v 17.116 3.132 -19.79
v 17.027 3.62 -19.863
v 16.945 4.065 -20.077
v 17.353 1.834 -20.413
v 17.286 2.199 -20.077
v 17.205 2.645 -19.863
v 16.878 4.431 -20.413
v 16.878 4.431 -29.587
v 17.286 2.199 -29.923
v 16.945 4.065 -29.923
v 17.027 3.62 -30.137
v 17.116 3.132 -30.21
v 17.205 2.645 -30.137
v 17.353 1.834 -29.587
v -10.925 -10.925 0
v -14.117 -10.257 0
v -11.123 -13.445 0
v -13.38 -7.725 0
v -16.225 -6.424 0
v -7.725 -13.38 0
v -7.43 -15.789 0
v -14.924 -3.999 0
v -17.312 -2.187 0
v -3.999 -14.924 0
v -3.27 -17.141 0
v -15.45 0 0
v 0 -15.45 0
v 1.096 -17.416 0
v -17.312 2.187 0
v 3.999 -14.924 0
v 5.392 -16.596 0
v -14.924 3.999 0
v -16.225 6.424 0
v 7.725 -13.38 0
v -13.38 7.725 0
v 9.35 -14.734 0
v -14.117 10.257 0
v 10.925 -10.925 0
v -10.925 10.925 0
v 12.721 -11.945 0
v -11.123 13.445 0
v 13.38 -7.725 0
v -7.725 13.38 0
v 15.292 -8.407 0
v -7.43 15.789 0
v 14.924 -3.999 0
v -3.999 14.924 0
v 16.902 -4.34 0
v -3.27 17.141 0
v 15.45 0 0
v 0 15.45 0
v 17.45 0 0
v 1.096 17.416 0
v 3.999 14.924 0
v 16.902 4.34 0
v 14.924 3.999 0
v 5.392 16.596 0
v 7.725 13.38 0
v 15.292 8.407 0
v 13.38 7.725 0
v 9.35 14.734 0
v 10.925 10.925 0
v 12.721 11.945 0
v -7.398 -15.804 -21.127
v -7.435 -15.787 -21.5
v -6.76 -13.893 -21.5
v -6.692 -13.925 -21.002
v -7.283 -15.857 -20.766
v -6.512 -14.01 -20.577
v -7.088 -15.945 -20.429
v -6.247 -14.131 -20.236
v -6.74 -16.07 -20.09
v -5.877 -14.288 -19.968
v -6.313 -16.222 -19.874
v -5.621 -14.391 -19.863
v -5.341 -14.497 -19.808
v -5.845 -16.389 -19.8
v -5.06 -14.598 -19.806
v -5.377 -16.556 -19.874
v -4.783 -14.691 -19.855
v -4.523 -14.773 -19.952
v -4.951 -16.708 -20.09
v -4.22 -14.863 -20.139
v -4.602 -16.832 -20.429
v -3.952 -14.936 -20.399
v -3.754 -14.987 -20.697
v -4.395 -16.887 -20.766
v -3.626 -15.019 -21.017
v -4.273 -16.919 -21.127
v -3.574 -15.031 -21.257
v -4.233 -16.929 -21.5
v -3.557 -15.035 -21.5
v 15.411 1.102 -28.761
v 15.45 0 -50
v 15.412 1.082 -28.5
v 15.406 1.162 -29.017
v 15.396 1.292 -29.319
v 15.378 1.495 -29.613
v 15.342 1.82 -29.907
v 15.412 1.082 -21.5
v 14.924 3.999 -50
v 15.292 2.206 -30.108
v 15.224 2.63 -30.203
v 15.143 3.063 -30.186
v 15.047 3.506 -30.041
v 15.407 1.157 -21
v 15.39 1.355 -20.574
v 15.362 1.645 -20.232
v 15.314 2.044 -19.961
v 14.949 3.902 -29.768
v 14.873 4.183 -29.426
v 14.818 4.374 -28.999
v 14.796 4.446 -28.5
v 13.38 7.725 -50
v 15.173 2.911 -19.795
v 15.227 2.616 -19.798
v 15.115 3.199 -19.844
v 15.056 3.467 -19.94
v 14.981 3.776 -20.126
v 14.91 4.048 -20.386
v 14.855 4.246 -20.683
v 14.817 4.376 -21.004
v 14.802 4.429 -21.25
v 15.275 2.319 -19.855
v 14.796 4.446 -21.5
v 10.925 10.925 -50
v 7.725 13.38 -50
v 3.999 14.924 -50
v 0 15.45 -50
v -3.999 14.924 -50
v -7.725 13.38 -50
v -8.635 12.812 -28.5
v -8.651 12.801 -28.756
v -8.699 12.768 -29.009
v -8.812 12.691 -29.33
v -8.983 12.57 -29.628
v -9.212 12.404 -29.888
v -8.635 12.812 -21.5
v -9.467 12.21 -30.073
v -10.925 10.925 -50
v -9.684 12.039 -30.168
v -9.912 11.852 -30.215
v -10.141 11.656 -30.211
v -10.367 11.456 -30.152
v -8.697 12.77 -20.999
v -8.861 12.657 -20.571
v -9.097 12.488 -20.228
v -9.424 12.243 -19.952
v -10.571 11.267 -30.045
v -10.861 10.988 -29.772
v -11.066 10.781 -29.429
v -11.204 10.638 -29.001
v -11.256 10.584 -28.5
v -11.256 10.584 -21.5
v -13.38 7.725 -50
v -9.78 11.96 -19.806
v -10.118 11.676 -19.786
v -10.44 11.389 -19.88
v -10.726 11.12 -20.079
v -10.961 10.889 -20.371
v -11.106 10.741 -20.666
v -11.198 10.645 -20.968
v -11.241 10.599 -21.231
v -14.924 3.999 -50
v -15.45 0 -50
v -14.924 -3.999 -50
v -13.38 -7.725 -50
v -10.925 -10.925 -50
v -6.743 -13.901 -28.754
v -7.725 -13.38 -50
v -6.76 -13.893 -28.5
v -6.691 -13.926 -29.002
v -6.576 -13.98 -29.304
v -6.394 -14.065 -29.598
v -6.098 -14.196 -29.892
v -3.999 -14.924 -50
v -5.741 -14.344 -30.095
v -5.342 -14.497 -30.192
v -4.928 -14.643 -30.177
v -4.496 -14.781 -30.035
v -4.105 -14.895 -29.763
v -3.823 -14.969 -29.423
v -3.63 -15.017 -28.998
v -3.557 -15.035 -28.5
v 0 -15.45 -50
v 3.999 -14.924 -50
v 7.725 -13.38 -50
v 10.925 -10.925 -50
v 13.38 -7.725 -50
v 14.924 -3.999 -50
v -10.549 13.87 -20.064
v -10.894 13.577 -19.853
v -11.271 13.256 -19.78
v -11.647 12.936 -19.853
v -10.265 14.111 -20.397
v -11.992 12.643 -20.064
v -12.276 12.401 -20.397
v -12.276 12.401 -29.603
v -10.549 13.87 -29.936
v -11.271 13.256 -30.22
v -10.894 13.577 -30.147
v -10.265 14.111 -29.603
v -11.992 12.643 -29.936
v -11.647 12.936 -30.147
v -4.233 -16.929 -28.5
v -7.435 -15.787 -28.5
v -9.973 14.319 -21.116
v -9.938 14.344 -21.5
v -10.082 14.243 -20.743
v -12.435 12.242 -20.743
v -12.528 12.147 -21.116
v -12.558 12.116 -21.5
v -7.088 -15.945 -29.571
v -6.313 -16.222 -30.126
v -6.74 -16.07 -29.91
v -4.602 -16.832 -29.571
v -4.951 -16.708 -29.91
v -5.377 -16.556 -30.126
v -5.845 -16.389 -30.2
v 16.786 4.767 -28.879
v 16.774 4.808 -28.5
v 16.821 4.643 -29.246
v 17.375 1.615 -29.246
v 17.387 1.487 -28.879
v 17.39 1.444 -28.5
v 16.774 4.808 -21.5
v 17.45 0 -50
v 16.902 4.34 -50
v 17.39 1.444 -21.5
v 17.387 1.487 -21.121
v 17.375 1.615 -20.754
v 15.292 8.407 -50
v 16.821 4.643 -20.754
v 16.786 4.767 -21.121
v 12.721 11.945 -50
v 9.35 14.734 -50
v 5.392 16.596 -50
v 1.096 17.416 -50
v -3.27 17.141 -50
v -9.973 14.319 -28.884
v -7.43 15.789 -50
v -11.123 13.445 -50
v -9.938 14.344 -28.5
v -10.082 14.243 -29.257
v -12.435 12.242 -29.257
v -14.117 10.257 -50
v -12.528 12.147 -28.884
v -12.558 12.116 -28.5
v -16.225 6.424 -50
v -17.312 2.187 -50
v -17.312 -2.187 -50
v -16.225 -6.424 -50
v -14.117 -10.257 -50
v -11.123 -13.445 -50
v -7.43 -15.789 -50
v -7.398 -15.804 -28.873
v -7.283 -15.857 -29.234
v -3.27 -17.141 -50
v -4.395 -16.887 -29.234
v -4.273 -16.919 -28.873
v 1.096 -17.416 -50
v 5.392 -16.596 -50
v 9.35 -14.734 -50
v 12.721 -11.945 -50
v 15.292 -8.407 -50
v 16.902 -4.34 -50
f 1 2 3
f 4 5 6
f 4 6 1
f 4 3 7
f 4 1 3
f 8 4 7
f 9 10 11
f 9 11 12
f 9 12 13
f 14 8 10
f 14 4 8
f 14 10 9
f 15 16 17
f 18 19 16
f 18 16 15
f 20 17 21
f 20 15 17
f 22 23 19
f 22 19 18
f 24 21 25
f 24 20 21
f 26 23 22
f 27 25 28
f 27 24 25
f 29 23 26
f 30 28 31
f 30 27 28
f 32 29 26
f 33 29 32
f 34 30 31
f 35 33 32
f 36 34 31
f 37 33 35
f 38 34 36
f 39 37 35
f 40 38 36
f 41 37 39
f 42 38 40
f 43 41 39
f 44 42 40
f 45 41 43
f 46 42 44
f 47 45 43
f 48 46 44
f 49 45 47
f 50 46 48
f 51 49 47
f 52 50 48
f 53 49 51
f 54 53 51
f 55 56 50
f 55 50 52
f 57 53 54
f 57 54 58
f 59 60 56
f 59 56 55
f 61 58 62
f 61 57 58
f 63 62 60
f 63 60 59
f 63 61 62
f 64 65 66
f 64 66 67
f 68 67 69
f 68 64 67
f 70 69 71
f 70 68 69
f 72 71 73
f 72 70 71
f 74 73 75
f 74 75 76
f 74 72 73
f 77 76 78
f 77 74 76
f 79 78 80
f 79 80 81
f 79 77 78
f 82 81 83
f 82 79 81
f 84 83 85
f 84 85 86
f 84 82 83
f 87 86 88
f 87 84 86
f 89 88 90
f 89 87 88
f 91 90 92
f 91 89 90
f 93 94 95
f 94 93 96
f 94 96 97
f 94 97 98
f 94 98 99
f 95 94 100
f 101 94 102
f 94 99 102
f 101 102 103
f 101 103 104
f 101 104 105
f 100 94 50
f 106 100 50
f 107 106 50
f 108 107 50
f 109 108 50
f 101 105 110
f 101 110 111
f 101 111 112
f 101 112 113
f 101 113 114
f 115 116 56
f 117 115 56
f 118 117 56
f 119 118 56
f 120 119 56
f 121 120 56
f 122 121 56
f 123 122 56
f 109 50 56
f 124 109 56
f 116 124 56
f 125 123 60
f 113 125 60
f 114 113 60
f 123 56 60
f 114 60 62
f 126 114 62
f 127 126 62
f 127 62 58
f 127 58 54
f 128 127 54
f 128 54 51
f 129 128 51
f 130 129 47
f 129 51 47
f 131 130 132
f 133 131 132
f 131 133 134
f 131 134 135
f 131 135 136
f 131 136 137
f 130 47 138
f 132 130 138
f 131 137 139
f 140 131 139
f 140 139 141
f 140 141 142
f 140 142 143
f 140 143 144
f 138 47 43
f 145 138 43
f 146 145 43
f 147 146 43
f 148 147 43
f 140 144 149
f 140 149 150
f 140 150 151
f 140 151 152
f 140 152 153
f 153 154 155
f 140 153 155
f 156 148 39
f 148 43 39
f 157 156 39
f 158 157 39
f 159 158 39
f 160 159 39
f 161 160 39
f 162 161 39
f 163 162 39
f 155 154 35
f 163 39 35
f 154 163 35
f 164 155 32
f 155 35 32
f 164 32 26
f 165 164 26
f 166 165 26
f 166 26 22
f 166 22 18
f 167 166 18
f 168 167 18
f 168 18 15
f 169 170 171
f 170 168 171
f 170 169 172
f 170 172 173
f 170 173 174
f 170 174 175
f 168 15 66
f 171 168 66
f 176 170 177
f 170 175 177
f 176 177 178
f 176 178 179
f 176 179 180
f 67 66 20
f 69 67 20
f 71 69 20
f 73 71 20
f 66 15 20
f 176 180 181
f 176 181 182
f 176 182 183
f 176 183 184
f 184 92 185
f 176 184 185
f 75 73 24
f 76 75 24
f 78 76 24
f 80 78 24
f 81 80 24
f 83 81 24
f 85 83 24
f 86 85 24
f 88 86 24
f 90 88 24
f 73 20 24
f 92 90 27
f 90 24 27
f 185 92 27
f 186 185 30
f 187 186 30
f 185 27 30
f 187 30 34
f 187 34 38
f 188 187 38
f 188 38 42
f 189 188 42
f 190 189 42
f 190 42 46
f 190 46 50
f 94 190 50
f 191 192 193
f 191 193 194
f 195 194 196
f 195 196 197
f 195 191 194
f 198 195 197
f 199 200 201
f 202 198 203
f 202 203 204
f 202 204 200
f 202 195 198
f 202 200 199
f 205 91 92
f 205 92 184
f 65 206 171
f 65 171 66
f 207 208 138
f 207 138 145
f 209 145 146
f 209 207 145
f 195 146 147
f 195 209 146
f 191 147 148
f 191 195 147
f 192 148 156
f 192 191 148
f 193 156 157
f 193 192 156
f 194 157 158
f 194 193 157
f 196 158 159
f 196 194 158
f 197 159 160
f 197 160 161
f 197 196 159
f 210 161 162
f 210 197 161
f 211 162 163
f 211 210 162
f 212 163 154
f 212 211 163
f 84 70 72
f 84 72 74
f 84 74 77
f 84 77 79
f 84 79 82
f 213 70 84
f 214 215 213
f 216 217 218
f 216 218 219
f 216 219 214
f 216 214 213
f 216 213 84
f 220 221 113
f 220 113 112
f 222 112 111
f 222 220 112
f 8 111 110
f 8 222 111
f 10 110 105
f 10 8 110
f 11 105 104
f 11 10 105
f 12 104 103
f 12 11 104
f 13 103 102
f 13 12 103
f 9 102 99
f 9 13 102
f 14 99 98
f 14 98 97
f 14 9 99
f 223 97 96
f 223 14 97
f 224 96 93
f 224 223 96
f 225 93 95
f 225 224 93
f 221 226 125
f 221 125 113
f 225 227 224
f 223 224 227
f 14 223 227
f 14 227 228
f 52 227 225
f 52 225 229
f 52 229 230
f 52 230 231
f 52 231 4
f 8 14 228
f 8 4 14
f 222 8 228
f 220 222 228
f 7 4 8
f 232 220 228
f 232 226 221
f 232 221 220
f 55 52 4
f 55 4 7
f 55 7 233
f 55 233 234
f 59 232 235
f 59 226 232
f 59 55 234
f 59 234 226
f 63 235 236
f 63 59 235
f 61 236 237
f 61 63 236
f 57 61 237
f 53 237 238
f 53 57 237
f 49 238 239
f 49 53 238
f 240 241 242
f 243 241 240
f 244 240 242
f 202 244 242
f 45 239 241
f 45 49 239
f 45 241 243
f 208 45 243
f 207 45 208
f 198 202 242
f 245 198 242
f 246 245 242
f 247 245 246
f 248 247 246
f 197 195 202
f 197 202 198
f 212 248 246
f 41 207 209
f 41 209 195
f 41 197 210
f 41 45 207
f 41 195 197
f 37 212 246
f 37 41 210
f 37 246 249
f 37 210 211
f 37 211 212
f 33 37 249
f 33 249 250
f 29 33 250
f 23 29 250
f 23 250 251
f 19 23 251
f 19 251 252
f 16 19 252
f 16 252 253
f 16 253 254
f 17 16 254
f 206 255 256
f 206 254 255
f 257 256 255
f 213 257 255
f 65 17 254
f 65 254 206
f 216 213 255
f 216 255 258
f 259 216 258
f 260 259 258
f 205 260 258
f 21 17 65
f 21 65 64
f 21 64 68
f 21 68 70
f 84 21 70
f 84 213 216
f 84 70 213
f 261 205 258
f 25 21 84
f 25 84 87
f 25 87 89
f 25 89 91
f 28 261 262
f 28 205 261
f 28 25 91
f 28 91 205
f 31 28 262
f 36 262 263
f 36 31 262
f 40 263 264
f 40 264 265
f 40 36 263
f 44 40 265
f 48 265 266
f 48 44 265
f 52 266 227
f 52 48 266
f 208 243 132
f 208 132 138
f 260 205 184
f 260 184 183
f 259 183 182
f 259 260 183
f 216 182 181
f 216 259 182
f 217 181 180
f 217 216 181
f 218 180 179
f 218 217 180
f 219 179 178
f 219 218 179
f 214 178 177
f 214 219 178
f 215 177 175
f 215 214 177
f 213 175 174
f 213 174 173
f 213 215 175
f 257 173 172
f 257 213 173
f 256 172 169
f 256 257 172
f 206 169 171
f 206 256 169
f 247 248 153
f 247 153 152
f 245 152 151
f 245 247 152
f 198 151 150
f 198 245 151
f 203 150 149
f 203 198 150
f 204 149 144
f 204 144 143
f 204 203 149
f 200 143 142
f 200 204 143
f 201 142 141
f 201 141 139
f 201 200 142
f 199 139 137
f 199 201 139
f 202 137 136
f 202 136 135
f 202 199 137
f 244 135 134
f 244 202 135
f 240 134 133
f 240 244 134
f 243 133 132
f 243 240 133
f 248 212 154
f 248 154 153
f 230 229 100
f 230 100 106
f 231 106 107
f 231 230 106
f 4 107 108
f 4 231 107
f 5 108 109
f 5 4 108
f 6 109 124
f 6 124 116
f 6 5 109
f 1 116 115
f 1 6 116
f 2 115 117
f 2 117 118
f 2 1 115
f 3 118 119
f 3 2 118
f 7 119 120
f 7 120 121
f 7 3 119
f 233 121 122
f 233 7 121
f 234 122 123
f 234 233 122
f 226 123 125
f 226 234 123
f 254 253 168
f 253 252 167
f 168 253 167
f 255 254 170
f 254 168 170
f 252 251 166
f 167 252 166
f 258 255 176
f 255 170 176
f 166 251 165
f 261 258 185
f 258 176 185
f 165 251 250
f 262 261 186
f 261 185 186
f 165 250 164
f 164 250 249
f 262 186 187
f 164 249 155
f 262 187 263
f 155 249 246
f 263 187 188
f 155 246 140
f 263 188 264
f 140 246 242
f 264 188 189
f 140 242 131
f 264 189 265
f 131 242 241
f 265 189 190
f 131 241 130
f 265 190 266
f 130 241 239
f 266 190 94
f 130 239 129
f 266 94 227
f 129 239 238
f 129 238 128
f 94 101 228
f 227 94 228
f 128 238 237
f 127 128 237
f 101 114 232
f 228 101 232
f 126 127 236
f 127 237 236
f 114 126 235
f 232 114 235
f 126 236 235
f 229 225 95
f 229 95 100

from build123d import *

# Parameters (mm, degrees)
ESQUISSE1_R                  = 17.45
ESQUISSE1_R_2                = 15.45
BOSS_EXTRU_1_DEPTH           = 50
ENL_V_MAT_EXTRU_1_REACH      = 66.713
ENL_V_MAT_EXTRU_2_REACH      = 66.175
ENL_V_MAT_EXTRU_3_REACH      = 67.328
ENL_V_MAT_EXTRU_3_END_RADIUS = 15.45


with BuildPart() as part:
    # Esquisse1 → Boss.-Extru.1 (new body)
    with BuildSketch(Plane.XY):
        Circle(ESQUISSE1_R)
        Circle(ESQUISSE1_R_2, mode=Mode.SUBTRACT)
    extrude(amount=-BOSS_EXTRU_1_DEPTH)

    # Esquisse2 → Enlèv. mat.-Extru.1 (cut, up to next)
    with BuildSketch(Plane(origin=(-5.845108935, -16.388859068, 0), x_dir=(-0.9418884521644214, 0.3359258008538648, 0), z_dir=(-0.3359258008538648, -0.9418884521644214, 0)), mode=Mode.PRIVATE) as enl_v_mat_extru_1_sk1:
        with BuildLine():
            Line((1.7, 28.5), (1.7, 21.5))
            ThreePointArc((1.7, 21.5), (0, 19.8), (-1.7, 21.5))
            Line((-1.7, 21.5), (-1.7, 28.5))
            ThreePointArc((-1.7, 28.5), (0, 30.2), (1.7, 28.5))
        make_face()
    enl_v_mat_extru_1_tool1 = extrude(enl_v_mat_extru_1_sk1.sketch, amount=-ENL_V_MAT_EXTRU_1_REACH, mode=Mode.PRIVATE) & part.part
    add(enl_v_mat_extru_1_tool1.solids().sort_by_distance((-5.845109, -16.388859, -25))[0], mode=Mode.SUBTRACT)

    # Esquisse4 → Enlèv. mat.-Extru.2 (cut, up to next)
    with BuildSketch(Plane(origin=(17.115722759, 3.132416708, 0), x_dir=(0, 0, 1), z_dir=(0.9836622275325246, 0.18002394875613614, 0)), mode=Mode.PRIVATE) as enl_v_mat_extru_2_sk1:
        with BuildLine():
            Line((-28.5, 1.71), (-21.5, 1.71))
            ThreePointArc((-21.5, 1.71), (-19.79, 0), (-21.5, -1.71))
            Line((-21.5, -1.71), (-28.5, -1.71))
            ThreePointArc((-28.5, -1.71), (-30.21, 0), (-28.5, 1.71))
        make_face()
    enl_v_mat_extru_2_tool1 = extrude(enl_v_mat_extru_2_sk1.sketch, amount=-ENL_V_MAT_EXTRU_2_REACH, mode=Mode.PRIVATE) & part.part
    add(enl_v_mat_extru_2_tool1.solids().sort_by_distance((17.115723, 3.132417, -25))[0], mode=Mode.SUBTRACT)

    # Enlèv. mat.-Extru.3: up to this cylinder (the profile starts outside it)
    enl_v_mat_extru_3_end = Plane(origin=(0, 0, -25), z_dir=(0, 0, 1)) * Cylinder(ENL_V_MAT_EXTRU_3_END_RADIUS, 166.556, mode=Mode.PRIVATE)
    # Esquisse5 → Enlèv. mat.-Extru.3 (cut, up to the surface)
    with BuildSketch(Plane(origin=(-11.270613824, 13.256442359, 0), x_dir=(0, 0, 1), z_dir=(-0.6477364266786677, 0.761864503408284, 0)), mode=Mode.PRIVATE) as enl_v_mat_extru_3_sk1:
        with BuildLine():
            Line((-28.5, 1.72), (-21.5, 1.72))
            ThreePointArc((-21.5, 1.72), (-19.78, 0), (-21.5, -1.72))
            Line((-21.5, -1.72), (-28.5, -1.72))
            ThreePointArc((-28.5, -1.72), (-30.22, 0), (-28.5, 1.72))
        make_face()
    enl_v_mat_extru_3_tool1 = extrude(enl_v_mat_extru_3_sk1.sketch, amount=-ENL_V_MAT_EXTRU_3_REACH, mode=Mode.PRIVATE) - enl_v_mat_extru_3_end
    add(enl_v_mat_extru_3_tool1.solids().sort_by_distance((-11.270614, 13.256442, -25))[0], mode=Mode.SUBTRACT)


solid = part.part
